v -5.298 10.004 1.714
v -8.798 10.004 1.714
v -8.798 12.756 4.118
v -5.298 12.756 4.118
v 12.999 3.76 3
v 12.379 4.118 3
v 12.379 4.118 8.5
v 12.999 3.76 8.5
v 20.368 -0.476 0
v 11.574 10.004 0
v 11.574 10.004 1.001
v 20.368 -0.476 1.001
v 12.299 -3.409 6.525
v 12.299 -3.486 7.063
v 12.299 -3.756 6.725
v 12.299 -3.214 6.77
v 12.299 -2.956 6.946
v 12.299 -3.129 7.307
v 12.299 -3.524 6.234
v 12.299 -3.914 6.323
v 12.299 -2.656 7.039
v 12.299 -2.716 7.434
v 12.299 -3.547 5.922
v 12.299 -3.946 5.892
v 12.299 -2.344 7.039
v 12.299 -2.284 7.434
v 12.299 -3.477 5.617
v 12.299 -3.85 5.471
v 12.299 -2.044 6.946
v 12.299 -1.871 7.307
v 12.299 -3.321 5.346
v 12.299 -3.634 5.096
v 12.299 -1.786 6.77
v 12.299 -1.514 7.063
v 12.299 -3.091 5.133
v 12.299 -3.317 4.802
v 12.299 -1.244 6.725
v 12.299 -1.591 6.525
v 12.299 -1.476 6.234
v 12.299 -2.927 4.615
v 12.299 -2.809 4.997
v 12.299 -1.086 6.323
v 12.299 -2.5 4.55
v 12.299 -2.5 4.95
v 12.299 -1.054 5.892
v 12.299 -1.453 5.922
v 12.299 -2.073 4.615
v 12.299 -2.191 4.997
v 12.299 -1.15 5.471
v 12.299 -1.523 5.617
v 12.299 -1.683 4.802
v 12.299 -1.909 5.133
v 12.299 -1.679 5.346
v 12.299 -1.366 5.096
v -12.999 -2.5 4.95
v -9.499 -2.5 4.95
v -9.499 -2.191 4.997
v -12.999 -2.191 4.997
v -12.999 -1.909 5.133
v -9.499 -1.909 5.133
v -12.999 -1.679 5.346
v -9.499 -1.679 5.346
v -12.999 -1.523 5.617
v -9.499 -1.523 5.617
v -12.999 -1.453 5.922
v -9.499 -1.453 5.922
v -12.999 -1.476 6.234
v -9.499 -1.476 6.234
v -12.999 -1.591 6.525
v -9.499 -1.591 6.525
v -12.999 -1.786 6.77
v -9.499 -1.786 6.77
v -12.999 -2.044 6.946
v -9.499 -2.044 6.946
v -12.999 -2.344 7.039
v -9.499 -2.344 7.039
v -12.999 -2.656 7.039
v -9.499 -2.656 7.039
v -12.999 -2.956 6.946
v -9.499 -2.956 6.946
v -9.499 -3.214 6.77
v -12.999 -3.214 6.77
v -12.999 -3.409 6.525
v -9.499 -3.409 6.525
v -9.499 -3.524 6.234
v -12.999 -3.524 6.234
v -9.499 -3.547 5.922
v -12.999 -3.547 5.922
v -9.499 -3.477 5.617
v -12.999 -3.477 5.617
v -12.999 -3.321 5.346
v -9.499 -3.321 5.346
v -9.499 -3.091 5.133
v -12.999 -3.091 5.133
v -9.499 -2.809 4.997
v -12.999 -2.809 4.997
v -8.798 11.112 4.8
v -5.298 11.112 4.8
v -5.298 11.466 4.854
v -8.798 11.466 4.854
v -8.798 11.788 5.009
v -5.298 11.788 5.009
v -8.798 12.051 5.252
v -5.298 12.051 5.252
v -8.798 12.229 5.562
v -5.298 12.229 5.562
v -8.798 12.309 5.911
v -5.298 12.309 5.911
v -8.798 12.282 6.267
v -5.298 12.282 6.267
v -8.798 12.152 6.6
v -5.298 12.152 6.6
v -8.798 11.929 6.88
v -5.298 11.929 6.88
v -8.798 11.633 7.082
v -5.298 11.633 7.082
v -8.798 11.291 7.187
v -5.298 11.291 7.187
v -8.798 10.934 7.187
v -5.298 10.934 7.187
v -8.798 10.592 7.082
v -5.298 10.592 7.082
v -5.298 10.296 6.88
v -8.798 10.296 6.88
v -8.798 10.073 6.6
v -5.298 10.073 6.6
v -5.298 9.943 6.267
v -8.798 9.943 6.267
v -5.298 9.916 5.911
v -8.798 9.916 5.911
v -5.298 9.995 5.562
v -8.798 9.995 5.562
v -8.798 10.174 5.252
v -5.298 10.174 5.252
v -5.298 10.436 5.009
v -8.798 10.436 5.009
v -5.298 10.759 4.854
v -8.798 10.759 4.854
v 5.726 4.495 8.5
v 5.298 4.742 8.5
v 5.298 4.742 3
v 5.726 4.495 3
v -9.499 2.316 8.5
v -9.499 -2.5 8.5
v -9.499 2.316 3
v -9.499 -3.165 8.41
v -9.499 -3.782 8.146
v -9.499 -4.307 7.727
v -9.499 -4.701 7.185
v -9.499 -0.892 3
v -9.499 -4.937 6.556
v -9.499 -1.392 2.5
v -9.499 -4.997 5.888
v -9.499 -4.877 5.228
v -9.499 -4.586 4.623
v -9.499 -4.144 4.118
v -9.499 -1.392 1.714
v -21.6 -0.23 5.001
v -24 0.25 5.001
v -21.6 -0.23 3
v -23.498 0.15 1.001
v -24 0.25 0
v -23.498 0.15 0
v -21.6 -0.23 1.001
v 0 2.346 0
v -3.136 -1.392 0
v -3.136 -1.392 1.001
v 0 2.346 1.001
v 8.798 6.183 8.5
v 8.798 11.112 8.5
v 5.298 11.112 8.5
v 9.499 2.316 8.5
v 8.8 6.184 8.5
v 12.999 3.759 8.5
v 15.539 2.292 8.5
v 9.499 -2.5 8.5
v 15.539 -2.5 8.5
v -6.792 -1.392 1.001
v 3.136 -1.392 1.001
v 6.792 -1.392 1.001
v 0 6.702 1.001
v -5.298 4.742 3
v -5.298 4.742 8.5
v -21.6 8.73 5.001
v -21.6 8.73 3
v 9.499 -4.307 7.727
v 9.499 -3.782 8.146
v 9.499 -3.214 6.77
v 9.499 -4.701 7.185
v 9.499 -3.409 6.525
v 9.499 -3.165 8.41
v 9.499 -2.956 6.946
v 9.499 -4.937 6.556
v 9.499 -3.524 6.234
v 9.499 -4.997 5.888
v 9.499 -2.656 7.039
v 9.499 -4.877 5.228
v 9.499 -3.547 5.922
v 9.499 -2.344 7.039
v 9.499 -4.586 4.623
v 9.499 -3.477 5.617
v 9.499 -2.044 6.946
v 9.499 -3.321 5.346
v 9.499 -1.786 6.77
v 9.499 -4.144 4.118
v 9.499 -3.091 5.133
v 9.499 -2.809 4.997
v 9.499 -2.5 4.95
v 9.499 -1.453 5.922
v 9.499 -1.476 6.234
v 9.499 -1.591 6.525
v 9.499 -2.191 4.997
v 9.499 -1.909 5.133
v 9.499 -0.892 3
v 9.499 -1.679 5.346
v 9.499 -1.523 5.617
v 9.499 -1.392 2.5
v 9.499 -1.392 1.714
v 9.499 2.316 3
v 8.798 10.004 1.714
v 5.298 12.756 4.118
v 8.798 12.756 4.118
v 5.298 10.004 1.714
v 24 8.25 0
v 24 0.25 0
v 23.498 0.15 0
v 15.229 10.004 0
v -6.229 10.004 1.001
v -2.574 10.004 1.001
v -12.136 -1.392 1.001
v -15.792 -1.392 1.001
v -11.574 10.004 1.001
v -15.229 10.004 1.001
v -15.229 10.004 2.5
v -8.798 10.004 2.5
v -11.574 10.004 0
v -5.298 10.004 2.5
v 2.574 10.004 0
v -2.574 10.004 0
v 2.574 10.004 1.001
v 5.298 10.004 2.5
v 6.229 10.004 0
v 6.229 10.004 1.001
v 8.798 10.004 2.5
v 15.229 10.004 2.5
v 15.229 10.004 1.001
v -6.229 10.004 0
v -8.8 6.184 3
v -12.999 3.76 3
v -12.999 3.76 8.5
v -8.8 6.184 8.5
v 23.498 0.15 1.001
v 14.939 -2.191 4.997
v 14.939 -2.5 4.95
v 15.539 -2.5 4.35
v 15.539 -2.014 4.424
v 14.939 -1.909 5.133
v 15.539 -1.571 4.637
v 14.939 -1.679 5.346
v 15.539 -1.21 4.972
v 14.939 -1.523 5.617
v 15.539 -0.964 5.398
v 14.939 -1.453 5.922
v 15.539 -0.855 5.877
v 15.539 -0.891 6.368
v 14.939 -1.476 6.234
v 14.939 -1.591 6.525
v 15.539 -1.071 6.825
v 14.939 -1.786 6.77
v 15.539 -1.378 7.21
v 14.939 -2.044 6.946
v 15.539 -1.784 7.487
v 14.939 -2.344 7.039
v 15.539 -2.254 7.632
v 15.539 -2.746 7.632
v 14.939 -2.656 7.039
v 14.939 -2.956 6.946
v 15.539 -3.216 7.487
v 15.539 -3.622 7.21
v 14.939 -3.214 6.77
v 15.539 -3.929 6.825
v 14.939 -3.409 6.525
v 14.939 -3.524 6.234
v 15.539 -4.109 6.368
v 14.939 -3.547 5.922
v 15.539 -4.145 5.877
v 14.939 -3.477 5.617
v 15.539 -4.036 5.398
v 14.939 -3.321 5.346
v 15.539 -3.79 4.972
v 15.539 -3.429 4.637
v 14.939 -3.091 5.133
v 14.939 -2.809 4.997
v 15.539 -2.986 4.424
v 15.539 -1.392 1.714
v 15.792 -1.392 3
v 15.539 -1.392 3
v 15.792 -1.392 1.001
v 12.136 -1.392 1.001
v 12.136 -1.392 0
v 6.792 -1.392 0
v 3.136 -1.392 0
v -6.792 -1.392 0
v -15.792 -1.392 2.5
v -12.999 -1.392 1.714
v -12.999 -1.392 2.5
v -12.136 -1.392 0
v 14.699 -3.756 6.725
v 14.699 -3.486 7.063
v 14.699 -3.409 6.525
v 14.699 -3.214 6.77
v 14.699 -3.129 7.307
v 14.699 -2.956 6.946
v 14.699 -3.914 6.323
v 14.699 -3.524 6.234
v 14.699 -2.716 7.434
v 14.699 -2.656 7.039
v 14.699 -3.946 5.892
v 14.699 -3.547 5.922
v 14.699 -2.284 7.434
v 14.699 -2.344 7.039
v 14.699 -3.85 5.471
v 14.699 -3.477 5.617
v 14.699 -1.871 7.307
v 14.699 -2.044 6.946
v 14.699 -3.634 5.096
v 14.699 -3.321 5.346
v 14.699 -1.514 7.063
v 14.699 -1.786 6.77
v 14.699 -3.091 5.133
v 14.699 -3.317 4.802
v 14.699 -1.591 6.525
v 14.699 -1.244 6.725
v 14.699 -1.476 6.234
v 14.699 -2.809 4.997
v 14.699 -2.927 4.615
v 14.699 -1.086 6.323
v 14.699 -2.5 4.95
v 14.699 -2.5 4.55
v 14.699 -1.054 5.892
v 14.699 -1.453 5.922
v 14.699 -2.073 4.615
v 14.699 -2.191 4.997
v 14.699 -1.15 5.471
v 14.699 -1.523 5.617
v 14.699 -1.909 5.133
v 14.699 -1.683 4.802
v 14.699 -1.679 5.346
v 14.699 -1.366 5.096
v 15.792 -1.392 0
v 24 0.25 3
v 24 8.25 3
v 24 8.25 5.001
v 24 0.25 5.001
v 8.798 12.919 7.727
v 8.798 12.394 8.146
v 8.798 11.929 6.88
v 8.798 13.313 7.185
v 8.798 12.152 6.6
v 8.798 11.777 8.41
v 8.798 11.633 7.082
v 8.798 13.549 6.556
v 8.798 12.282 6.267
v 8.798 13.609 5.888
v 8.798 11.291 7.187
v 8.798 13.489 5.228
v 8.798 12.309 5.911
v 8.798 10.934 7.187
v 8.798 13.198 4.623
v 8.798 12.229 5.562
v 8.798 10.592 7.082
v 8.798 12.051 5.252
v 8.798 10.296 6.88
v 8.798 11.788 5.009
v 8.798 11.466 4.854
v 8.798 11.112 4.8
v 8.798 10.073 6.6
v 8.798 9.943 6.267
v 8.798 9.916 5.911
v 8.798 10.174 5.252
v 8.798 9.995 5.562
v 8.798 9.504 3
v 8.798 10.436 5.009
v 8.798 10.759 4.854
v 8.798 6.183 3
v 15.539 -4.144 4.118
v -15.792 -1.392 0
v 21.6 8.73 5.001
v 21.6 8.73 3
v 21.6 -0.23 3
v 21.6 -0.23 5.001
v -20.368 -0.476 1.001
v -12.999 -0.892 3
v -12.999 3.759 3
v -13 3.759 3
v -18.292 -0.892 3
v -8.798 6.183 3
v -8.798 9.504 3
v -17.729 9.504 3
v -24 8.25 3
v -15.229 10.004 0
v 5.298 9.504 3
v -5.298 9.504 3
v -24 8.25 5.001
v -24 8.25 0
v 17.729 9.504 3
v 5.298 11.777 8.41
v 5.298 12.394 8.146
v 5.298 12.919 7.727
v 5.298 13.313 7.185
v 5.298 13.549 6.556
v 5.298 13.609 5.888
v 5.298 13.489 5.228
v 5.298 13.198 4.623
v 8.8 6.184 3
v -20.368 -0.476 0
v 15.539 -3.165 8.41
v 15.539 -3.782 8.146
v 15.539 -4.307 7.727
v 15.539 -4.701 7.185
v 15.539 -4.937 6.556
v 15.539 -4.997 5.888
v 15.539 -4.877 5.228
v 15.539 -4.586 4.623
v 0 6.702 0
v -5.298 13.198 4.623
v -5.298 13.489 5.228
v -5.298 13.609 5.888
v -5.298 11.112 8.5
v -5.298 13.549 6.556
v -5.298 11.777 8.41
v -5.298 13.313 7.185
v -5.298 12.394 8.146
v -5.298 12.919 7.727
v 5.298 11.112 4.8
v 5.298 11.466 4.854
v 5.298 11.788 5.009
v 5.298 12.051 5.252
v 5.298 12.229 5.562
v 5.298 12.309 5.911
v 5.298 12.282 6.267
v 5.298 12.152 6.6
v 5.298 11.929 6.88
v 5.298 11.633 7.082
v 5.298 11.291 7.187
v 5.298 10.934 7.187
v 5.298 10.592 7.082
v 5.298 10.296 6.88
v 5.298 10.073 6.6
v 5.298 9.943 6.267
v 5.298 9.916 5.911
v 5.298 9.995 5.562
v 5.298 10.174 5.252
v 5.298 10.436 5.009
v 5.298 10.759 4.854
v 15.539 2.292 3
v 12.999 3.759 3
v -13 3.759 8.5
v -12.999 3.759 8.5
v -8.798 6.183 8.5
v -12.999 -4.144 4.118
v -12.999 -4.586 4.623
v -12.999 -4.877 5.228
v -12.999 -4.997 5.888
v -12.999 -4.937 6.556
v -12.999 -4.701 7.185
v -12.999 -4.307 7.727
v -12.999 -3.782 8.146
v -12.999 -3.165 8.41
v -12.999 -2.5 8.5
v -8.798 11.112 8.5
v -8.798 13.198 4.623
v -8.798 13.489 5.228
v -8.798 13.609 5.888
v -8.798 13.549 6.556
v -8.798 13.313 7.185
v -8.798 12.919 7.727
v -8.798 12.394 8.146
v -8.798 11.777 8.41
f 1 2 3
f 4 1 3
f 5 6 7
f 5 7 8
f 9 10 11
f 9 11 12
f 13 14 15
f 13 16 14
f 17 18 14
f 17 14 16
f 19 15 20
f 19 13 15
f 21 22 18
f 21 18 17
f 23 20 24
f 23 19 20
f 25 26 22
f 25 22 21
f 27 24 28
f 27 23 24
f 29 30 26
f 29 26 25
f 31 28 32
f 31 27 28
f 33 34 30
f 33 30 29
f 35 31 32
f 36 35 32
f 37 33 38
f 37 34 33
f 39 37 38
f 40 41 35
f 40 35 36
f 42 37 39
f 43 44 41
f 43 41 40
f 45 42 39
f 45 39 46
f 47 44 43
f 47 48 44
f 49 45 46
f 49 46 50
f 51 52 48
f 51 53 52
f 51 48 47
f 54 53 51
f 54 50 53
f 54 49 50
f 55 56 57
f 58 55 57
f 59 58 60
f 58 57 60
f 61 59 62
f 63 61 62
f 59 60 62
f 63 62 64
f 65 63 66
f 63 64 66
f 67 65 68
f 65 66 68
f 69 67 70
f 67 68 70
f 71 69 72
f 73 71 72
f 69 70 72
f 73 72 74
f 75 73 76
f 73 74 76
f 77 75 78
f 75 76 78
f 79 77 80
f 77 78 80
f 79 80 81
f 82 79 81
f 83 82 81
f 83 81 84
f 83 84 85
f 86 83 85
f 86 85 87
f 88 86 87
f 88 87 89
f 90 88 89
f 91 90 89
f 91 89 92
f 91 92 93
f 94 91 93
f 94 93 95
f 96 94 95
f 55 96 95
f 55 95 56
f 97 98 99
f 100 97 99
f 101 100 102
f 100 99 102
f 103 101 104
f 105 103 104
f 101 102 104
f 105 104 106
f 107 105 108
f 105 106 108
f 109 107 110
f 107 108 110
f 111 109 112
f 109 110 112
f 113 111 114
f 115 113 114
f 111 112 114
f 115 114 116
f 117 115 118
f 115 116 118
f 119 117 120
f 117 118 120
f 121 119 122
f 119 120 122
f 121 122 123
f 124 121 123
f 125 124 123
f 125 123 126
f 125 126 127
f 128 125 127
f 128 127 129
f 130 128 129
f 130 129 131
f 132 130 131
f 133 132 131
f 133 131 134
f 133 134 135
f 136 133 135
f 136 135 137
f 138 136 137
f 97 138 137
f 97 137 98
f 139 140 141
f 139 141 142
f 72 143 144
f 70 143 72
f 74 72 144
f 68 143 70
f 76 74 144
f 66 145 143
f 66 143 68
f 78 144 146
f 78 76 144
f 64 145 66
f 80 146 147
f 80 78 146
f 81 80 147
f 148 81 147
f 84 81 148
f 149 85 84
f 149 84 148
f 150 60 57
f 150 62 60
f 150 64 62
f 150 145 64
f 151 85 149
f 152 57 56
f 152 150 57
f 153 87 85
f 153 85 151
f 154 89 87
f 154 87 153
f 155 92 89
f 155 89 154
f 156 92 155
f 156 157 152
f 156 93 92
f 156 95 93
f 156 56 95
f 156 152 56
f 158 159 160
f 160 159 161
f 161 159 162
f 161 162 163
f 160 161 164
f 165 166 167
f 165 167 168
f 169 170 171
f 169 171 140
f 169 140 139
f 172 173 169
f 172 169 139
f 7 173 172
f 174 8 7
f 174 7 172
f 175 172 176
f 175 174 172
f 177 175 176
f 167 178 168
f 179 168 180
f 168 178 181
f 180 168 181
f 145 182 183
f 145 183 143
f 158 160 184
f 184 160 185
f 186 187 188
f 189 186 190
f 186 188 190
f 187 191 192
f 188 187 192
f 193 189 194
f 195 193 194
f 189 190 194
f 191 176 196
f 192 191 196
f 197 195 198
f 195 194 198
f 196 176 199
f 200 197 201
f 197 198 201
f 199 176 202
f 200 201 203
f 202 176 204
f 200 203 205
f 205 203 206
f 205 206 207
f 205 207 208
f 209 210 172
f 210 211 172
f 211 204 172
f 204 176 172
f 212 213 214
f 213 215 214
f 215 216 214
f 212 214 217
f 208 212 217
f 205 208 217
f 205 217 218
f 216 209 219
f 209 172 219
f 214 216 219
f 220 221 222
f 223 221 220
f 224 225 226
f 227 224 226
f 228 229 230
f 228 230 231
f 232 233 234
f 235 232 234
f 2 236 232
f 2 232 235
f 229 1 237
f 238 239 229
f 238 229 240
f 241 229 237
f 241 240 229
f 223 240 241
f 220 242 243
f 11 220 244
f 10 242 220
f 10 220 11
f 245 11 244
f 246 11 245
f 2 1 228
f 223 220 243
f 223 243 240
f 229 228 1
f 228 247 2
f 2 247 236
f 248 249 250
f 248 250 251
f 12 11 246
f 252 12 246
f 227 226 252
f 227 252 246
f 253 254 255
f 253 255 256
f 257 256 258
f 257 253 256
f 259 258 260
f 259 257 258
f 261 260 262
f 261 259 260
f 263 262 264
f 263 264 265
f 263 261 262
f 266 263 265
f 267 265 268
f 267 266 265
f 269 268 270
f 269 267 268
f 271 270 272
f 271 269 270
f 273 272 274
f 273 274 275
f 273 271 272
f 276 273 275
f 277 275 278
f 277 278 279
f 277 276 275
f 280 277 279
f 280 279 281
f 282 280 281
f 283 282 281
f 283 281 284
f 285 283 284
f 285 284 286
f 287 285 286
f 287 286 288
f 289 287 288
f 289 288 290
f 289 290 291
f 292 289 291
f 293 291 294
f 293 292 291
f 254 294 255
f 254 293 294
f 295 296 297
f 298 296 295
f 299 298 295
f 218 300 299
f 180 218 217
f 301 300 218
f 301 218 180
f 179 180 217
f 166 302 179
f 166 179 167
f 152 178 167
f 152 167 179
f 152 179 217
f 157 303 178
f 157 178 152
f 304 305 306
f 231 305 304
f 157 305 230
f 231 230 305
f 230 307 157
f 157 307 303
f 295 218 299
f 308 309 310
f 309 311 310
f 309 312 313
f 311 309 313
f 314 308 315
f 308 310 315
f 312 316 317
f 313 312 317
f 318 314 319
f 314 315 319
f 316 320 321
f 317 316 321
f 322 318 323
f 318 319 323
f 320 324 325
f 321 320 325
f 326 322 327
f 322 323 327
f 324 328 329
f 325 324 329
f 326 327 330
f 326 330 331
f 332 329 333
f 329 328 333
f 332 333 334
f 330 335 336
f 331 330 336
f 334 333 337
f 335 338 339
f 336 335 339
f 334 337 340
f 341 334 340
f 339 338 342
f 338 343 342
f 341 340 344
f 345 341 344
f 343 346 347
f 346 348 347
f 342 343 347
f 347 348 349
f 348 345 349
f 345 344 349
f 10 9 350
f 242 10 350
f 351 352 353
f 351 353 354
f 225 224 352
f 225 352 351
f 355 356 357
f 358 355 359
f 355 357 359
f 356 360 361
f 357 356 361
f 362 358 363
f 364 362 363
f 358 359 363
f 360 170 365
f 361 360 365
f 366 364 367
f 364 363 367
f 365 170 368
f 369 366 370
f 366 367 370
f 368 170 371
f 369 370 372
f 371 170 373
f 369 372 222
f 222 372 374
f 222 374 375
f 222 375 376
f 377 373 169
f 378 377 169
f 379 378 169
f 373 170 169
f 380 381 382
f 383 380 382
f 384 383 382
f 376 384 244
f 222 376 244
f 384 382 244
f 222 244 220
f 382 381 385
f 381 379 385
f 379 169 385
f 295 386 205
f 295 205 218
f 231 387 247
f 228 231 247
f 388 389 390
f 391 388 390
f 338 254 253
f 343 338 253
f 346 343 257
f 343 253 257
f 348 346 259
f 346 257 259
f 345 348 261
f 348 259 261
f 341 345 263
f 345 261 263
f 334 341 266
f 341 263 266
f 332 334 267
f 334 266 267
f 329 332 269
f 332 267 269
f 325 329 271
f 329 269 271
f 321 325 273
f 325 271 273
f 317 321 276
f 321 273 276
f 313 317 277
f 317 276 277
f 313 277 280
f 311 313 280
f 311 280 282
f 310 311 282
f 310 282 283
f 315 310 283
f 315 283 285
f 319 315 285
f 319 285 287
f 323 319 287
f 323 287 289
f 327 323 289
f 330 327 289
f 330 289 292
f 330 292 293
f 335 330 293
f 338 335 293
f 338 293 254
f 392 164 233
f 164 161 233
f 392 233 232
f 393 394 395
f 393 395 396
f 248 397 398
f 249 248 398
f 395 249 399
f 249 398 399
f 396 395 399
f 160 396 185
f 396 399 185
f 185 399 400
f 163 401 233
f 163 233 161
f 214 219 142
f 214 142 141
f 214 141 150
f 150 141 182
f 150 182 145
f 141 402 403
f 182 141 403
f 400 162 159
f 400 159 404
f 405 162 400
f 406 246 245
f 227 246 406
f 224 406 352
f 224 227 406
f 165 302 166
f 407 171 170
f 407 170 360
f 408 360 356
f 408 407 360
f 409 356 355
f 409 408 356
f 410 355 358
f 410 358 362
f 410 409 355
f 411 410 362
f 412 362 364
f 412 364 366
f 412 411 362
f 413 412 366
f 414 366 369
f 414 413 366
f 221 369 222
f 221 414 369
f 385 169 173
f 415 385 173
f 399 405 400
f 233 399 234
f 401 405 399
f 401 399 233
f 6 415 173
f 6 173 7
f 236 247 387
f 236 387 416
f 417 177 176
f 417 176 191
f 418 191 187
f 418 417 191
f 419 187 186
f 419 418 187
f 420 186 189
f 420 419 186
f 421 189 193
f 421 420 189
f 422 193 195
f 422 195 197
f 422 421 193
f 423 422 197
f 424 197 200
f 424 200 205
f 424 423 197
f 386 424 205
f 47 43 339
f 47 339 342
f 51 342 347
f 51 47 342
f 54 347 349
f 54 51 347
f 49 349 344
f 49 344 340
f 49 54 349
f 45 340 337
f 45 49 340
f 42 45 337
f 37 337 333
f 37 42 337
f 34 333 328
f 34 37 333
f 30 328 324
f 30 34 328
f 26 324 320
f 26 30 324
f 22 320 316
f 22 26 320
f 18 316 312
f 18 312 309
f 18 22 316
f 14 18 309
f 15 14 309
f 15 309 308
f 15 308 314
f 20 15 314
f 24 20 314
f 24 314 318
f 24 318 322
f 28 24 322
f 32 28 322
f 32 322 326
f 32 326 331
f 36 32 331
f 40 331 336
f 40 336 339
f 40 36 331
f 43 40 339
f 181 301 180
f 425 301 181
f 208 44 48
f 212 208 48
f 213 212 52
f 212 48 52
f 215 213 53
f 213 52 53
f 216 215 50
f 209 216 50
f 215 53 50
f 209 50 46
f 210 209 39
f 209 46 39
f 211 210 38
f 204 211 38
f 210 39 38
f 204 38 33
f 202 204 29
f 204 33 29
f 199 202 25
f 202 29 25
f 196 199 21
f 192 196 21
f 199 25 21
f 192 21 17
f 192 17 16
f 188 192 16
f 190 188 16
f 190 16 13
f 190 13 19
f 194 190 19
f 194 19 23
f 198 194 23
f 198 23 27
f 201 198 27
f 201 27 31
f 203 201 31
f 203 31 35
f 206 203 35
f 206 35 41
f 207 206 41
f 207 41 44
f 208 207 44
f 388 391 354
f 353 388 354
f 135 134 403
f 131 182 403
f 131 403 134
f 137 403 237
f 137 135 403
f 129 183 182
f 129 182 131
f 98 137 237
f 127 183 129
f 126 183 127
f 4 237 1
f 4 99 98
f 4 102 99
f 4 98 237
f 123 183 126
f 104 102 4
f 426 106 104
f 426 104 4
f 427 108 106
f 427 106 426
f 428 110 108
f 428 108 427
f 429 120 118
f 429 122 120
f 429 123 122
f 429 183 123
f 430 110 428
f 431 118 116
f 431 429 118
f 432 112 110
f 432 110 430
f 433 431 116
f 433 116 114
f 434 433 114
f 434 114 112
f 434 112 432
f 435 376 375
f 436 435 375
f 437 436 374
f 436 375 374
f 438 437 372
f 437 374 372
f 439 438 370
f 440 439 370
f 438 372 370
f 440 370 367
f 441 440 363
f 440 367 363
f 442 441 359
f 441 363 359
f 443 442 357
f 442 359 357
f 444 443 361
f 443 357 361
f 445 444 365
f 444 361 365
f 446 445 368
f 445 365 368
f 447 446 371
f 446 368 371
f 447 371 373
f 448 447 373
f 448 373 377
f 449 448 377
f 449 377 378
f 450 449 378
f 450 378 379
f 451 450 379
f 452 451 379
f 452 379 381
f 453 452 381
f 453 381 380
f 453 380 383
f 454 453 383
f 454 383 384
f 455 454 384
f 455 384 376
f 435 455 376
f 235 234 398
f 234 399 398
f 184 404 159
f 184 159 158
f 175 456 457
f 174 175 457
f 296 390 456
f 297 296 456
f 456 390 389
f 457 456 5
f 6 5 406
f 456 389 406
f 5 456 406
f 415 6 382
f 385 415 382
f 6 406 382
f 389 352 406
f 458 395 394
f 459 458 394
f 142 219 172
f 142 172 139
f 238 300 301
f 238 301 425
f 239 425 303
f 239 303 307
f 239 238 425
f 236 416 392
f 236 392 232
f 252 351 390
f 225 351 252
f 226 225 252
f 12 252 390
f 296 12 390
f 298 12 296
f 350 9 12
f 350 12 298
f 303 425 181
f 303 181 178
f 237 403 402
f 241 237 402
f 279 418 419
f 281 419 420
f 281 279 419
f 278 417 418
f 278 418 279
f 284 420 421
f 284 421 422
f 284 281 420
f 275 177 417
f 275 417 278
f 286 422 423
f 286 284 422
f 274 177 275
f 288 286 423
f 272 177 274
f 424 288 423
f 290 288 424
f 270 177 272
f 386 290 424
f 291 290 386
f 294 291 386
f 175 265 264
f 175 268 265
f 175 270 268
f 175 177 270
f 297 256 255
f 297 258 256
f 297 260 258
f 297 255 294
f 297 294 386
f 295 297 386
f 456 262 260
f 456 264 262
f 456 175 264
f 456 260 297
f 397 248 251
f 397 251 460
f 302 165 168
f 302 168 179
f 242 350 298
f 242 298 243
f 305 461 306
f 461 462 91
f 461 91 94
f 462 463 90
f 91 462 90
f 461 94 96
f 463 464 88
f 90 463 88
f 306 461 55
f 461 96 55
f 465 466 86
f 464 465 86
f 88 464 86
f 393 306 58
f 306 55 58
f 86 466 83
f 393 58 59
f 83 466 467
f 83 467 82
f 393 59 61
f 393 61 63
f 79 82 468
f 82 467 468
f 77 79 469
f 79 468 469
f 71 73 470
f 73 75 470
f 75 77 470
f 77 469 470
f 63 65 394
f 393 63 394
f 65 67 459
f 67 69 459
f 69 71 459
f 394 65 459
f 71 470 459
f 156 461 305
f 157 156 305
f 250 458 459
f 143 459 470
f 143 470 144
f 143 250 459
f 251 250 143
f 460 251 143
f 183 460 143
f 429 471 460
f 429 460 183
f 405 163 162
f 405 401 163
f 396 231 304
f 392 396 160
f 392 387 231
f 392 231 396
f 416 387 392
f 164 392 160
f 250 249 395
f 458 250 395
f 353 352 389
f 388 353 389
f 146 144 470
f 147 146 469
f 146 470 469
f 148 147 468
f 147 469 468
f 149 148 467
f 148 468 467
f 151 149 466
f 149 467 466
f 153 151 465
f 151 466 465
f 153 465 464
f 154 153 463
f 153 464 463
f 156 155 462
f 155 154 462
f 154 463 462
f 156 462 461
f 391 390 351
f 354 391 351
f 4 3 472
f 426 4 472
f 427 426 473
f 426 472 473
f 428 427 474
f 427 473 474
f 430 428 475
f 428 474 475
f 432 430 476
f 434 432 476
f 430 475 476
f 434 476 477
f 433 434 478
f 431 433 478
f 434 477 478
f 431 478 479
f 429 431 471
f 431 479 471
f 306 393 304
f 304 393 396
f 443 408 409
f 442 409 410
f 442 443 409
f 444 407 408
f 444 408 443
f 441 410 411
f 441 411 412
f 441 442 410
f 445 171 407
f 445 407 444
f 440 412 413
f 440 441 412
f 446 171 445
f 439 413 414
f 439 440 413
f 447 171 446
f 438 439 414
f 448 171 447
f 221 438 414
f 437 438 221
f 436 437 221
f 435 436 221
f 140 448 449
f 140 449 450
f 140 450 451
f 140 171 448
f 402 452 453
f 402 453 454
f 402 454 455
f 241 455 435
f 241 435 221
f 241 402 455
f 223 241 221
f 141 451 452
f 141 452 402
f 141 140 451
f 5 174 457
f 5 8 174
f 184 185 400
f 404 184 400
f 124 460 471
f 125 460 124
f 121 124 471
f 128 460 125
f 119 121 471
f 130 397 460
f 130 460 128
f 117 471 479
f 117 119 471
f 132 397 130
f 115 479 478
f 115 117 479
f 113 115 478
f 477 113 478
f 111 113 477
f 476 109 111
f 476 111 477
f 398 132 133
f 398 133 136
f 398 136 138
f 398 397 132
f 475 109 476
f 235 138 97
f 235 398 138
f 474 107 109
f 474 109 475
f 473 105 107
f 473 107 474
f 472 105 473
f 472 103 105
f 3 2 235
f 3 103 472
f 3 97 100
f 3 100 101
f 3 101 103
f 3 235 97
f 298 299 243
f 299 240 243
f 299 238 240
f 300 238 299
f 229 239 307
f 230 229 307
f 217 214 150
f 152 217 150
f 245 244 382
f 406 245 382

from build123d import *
from OCP.BRepAlgoAPI import BRepAlgoAPI_Cut
from OCP.TopTools import TopTools_ListOfShape

# Parameters (mm, degrees)
BOSS_EXTRUDE1_DEPTH    = 2.99974
BOSS_EXTRUDE2_DEPTH    = 5.00126
BOSS_EXTRUDE3_DEPTH    = 3.50012
CIRPATTERN1_COUNT      = 2
BOSS_EXTRUDE4_REACH    = 30.871
CUT_EXTRUDE1_DEPTH     = 5.5
CUT_EXTRUDE2_DEPTH     = 1.00076
MIRROR2_START          = -12.999258093
MIRROR2_DEPTH          = 7.70128
MIRROR2_START_2        = 2.99974
MIRROR2_2_DEPTH        = 5.5
MIRROR2_3_OUTLINE_W    = 4.20116
MIRROR2_3_OUTLINE_H    = 4.60831964
MIRROR2_3_OUTLINE_H_2  = 4.995876312
MIRROR2_3_DEPTH        = 2.99974
MIRROR2_4_DEPTH        = 5.5
SKETCH9_R              = 1.05
OUTSIDE_HOLES_DEPTH    = 41.329539227
SKETCH10_R             = 1.2
INSIDE_HOLES_DEPTH     = 37.513584997
BOSS_EXTRUDE5_START    = 2.54
SKETCH12_R             = 1.05
BOSS_EXTRUDE5_DEPTH    = 2.54
HEAD_POCKET_DEPTH      = 1.7
HEAD_POCKET_DEPTH_BACK = 0.7
SKETCH11_R             = 1.45
CHAMFER1_SIZE          = 0.6
CORNER_CUT_DEPTH       = 5.5
CHAMFER2_SIZE          = 0.5


with BuildPart() as part:
    # Sketch1 → Boss-Extrude1 (new body)
    with BuildSketch(Plane(origin=(0, 0, 0), x_dir=(-1, 0, 0), z_dir=(0, 0, -1))):
        Polygon((23.999998093, 0.250000321), (23.999998093, 8.25), (15.229382515, 10.004123688), (-15.229382515, 10.004123688), (-23.999998093, 8.25), (-23.999998093, 0.25), (-15.791597366, -1.39168036), (15.791597366, -1.39168036), align=None)
    extrude(amount=-BOSS_EXTRUDE1_DEPTH)

    # Sketch2 → Boss-Extrude2 (add)
    with BuildSketch(Plane(origin=(0, 0, 0), x_dir=(-1, 0, 0), z_dir=(0, 0, -1))):
        Polygon((21.599998474, -0.230000138), (21.599998474, 8.729999542), (23.999998093, 8.25), (23.999998093, 0.249999762), align=None)
        Polygon((-23.999998093, 0.249999762), (-23.999998093, 8.25), (-21.599998474, 8.729999542), (-21.599998474, -0.230000138), align=None)
    extrude(amount=-BOSS_EXTRUDE2_DEPTH)

    # Sketch3 → Boss-Extrude3 (add)
    with BuildSketch(Plane(origin=(12.999258093, 0, 0), x_dir=(0, 0, -1), z_dir=(1, 0, 0))):
        with BuildLine():
            Line((-2.99974, 4.117571831), (-8.49974, 4.117571354))
            Line((-8.49974, 4.117571354), (-8.49974, -2.500000222))
            ThreePointArc((-8.49974, -2.500000222), (-6.87834524, -4.840080872), (-4.117836275, -4.144028668))
            Line((-4.117836275, -4.144028668), (-1.714206095, -1.39168036))
            Line((-1.714206095, -1.39168036), (-2.99974, -1.39168036))
            Line((-2.99974, -1.39168036), (-2.99974, 4.117571831))
        make_face()
    boss_extrude3 = extrude(amount=-BOSS_EXTRUDE3_DEPTH)

    # CirPattern1: Boss-Extrude3 ×2 about axis
    cirpattern1_axis = Axis((9.148618093, 4.306221664, 0), (0, 0, 1))
    for i in range(1, CIRPATTERN1_COUNT):
        add(boss_extrude3.rotate(cirpattern1_axis, i * 360 / CIRPATTERN1_COUNT))

    # Sketch4 → Boss-Extrude4 (add, up to next)
    with BuildSketch(Plane.XY.offset(8.49974), mode=Mode.PRIVATE) as boss_extrude4_sk1:
        Polygon((8.799999237, 6.184122562), (12.999999024, 3.759251555), (9.499999024, 2.315876444), (5.299999237, 4.740747452), align=None)
    boss_extrude4_tool1 = extrude(boss_extrude4_sk1.sketch, amount=-BOSS_EXTRUDE4_REACH, mode=Mode.PRIVATE) - part.part
    add(boss_extrude4_tool1.solids().sort_by_distance((9.149999, 4.25, 8.49974))[0])


with BuildPart() as cut_extrude1_tool:
    # Sketch5 → Cut-Extrude1 (new body)
    with BuildSketch(Plane.XY.offset(8.49974)):
        Polygon((12.999999024, 3.759251555), (12.999258093, 4.117571354), (12.379370927, 4.117571354), align=None)
        Polygon((5.725868057, 4.494871974), (5.297978093, 4.494871974), (5.297978093, 4.74191436), align=None)
    extrude(amount=-CUT_EXTRUDE1_DEPTH)


with BuildPart() as part_1:
    add(part.part)

    # Cut-Extrude1: cut by cut_extrude1_tool, with a tolerance
    cut_extrude1_stock = TopTools_ListOfShape()
    cut_extrude1_stock.Append(part_1.part.wrapped)
    cut_extrude1_tools = TopTools_ListOfShape()
    cut_extrude1_tools.Append(cut_extrude1_tool.part.wrapped)
    cut_extrude1_cut = BRepAlgoAPI_Cut()
    cut_extrude1_cut.SetArguments(cut_extrude1_stock)
    cut_extrude1_cut.SetTools(cut_extrude1_tools)
    cut_extrude1_cut.SetFuzzyValue(0.00001)
    cut_extrude1_cut.Build()
    add(Compound.cast(cut_extrude1_cut.Shape()).solids(), mode=Mode.REPLACE)


with BuildPart() as cut_extrude2_tool:
    # Sketch6 → Cut-Extrude2 (new body)
    with BuildSketch(Plane(origin=(0, 0, 0), x_dir=(-1, 0, 0), z_dir=(0, 0, -1))):
        Polygon((20.368379593, -0.476323605), (11.367927551, 10.25), (15.229382515, 10.004123688), (23.498262405, 0.149653077), align=None)
        Polygon((2.36792779, 10.25), (12.437123299, -1.75), (15.791597366, -1.39168036), (6.023067951, 10.25), align=None)
        Polygon((0, 6.702231407), (7.092263699, -1.75), (3.437123299, -1.75), (0, 2.346204281), (-3.437123299, -1.75), (-7.092263699, -1.75), align=None)
        Polygon((-15.791597366, -1.39168036), (-6.023067951, 10.25), (-2.36792779, 10.25), (-12.437123299, -1.75), align=None)
        Polygon((-11.367927551, 10.25), (-20.368379593, -0.476323605), (-23.498262405, 0.149653077), (-15.229382515, 10.004123688), align=None)
    extrude(amount=-CUT_EXTRUDE2_DEPTH)


with BuildPart() as part_2:
    add(part_1.part)

    # Cut-Extrude2: cut by cut_extrude2_tool, with a tolerance
    cut_extrude2_stock = TopTools_ListOfShape()
    cut_extrude2_stock.Append(part_2.part.wrapped)
    cut_extrude2_tools = TopTools_ListOfShape()
    cut_extrude2_tools.Append(cut_extrude2_tool.part.wrapped)
    cut_extrude2_cut = BRepAlgoAPI_Cut()
    cut_extrude2_cut.SetArguments(cut_extrude2_stock)
    cut_extrude2_cut.SetTools(cut_extrude2_tools)
    cut_extrude2_cut.SetFuzzyValue(0.00001)
    cut_extrude2_cut.Build()
    add(Compound.cast(cut_extrude2_cut.Shape()).solids(), mode=Mode.REPLACE)

    # Mirror2: read off the stored shape, not the designer's step
    # Mirror2 outline → Mirror2 (add)
    with BuildSketch(Plane.YZ.offset(MIRROR2_START)):
        with BuildLine():
            Line((11.11244355, 8.49974), (-2.500000222, 8.49974))
            ThreePointArc((-2.500000222, 8.49974), (-4.840080872, 6.87834524), (-4.144028668, 4.117836275))
            Line((-4.144028668, 4.117836275), (-1.39168036, 1.714206095))
            Line((-1.39168036, 1.714206095), (-1.39168036, 2.99974))
            Line((-1.39168036, 2.99974), (10.004123688, 2.99974))
            Line((10.004123688, 2.99974), (10.004123688, 1.714206095))
            Line((10.004123688, 1.714206095), (12.756471996, 4.117836275))
            ThreePointArc((12.756471996, 4.117836275), (13.4525242, 6.87834524), (11.11244355, 8.49974))
        make_face()
    extrude(amount=MIRROR2_DEPTH)

    # Mirror2 2 outline → Mirror2 2 (cut)
    with BuildSketch(Plane.XY.offset(MIRROR2_START_2)):
        Polygon((-5.297978093, 4.74191436), (-9.499138093, 2.316373503), (-9.499138093, -6), (-5.297978093, -6), align=None)
        Polygon((-12.999258093, 3.759679332), (-8.799999237, 6.184122562), (-8.798098093, 6.183338544), (-8.798098093, 15), (-12.999258093, 15), align=None)
    extrude(amount=MIRROR2_2_DEPTH, mode=Mode.SUBTRACT)

    # Mirror2 3 outline → Mirror2 3 (cut)
    with BuildSketch(Plane.XY):
        with Locations((-7.398558093, -3.69584018)):
            Rectangle(MIRROR2_3_OUTLINE_W, MIRROR2_3_OUTLINE_H)
        with Locations((-10.898678093, 12.502061844)):
            Rectangle(MIRROR2_3_OUTLINE_W, MIRROR2_3_OUTLINE_H_2)
    extrude(amount=MIRROR2_3_DEPTH, mode=Mode.SUBTRACT)

    # Mirror2 4 outline → Mirror2 4 (add)
    with BuildSketch(Plane.XY.offset(MIRROR2_START_2)):
        Polygon((-12.999999024, 3.759251555), (-12.999258093, 3.758946), (-12.999258093, 3.759679332), align=None)
    extrude(amount=MIRROR2_4_DEPTH)

    # Sketch9 → Outside_Holes (cut, through all)
    with BuildSketch(Plane(origin=(12.999258093, 0, 0), x_dir=(0, 0, -1), z_dir=(1, 0, 0))):
        with Locations((-6.00038, -2.500000222)):
            Circle(SKETCH9_R)
    extrude(amount=-OUTSIDE_HOLES_DEPTH, mode=Mode.SUBTRACT)

    # Sketch10 → Inside_Holes (cut, through all)
    with BuildSketch(Plane(origin=(8.798098093, 0, 0), x_dir=(0, 0, -1), z_dir=(1, 0, 0))):
        with Locations((-6.00038, 11.11244355)):
            Circle(SKETCH10_R)
    extrude(amount=-INSIDE_HOLES_DEPTH, mode=Mode.SUBTRACT)

    # Sketch12 → Boss-Extrude5 (add)
    with BuildSketch(Plane(origin=(12.999258093, 0, 0), x_dir=(0, 0, -1), z_dir=(1, 0, 0)).offset(BOSS_EXTRUDE5_START)):
        with BuildLine():
            Line((-2.99974, 3.758946), (-8.49974, 3.758946))
            Line((-8.49974, 3.758946), (-8.49974, -2.500000222))
            ThreePointArc((-8.49974, -2.500000222), (-6.87834524, -4.840080872), (-4.117836275, -4.144028668))
            Line((-4.117836275, -4.144028668), (-1.714206095, -1.39168036))
            Line((-1.714206095, -1.39168036), (-2.99974, -1.39168036))
            Line((-2.99974, -1.39168036), (-2.99974, 3.758946))
        make_face()
        with Locations((-6.00038, -2.500000222)):
            Circle(SKETCH12_R, mode=Mode.SUBTRACT)
    extrude(amount=-BOSS_EXTRUDE5_DEPTH)

    # Sketch11 → Head_Pocket (cut, two sides: drawn at the far end of the back side and taken through both)
    with BuildSketch(Plane(origin=(12.999258093, 0, 0), x_dir=(0, 0, -1), z_dir=(1, 0, 0)).offset(-HEAD_POCKET_DEPTH_BACK)):
        with Locations((-6.00038, -2.500000222)):
            Circle(SKETCH11_R)
    extrude(amount=HEAD_POCKET_DEPTH + HEAD_POCKET_DEPTH_BACK, mode=Mode.SUBTRACT)

    # Chamfer1
    chamfer1_edges = [part_2.edges().sort_by_distance(p)[0] for p in [
        (15.539258093, -2.500000222, 7.05038),
    ]]
    chamfer(chamfer1_edges, length=CHAMFER1_SIZE)

    # Sketch13 → Corner_Cut (cut)
    with BuildSketch(Plane.XY.offset(8.49974)):
        Polygon((15.539258093, 3.758946), (15.539258093, 2.292476317), (12.999258093, 3.758946), align=None)
    extrude(amount=-CORNER_CUT_DEPTH, mode=Mode.SUBTRACT)

    # Chamfer2
    chamfer2_edges = [part_2.edges().sort_by_distance(p)[0] for p in [
        (-10.898678093, 10.004123688, 2.99974),
        (-14.39542773, -1.39168036, 2.99974),
        (0, 10.004123688, 2.99974),
        (2.10058, -1.39168036, 2.99974),
        (12.013740304, 10.004123688, 2.99974),
    ]]
    chamfer(chamfer2_edges, length=CHAMFER2_SIZE)


solid = part_2.part
